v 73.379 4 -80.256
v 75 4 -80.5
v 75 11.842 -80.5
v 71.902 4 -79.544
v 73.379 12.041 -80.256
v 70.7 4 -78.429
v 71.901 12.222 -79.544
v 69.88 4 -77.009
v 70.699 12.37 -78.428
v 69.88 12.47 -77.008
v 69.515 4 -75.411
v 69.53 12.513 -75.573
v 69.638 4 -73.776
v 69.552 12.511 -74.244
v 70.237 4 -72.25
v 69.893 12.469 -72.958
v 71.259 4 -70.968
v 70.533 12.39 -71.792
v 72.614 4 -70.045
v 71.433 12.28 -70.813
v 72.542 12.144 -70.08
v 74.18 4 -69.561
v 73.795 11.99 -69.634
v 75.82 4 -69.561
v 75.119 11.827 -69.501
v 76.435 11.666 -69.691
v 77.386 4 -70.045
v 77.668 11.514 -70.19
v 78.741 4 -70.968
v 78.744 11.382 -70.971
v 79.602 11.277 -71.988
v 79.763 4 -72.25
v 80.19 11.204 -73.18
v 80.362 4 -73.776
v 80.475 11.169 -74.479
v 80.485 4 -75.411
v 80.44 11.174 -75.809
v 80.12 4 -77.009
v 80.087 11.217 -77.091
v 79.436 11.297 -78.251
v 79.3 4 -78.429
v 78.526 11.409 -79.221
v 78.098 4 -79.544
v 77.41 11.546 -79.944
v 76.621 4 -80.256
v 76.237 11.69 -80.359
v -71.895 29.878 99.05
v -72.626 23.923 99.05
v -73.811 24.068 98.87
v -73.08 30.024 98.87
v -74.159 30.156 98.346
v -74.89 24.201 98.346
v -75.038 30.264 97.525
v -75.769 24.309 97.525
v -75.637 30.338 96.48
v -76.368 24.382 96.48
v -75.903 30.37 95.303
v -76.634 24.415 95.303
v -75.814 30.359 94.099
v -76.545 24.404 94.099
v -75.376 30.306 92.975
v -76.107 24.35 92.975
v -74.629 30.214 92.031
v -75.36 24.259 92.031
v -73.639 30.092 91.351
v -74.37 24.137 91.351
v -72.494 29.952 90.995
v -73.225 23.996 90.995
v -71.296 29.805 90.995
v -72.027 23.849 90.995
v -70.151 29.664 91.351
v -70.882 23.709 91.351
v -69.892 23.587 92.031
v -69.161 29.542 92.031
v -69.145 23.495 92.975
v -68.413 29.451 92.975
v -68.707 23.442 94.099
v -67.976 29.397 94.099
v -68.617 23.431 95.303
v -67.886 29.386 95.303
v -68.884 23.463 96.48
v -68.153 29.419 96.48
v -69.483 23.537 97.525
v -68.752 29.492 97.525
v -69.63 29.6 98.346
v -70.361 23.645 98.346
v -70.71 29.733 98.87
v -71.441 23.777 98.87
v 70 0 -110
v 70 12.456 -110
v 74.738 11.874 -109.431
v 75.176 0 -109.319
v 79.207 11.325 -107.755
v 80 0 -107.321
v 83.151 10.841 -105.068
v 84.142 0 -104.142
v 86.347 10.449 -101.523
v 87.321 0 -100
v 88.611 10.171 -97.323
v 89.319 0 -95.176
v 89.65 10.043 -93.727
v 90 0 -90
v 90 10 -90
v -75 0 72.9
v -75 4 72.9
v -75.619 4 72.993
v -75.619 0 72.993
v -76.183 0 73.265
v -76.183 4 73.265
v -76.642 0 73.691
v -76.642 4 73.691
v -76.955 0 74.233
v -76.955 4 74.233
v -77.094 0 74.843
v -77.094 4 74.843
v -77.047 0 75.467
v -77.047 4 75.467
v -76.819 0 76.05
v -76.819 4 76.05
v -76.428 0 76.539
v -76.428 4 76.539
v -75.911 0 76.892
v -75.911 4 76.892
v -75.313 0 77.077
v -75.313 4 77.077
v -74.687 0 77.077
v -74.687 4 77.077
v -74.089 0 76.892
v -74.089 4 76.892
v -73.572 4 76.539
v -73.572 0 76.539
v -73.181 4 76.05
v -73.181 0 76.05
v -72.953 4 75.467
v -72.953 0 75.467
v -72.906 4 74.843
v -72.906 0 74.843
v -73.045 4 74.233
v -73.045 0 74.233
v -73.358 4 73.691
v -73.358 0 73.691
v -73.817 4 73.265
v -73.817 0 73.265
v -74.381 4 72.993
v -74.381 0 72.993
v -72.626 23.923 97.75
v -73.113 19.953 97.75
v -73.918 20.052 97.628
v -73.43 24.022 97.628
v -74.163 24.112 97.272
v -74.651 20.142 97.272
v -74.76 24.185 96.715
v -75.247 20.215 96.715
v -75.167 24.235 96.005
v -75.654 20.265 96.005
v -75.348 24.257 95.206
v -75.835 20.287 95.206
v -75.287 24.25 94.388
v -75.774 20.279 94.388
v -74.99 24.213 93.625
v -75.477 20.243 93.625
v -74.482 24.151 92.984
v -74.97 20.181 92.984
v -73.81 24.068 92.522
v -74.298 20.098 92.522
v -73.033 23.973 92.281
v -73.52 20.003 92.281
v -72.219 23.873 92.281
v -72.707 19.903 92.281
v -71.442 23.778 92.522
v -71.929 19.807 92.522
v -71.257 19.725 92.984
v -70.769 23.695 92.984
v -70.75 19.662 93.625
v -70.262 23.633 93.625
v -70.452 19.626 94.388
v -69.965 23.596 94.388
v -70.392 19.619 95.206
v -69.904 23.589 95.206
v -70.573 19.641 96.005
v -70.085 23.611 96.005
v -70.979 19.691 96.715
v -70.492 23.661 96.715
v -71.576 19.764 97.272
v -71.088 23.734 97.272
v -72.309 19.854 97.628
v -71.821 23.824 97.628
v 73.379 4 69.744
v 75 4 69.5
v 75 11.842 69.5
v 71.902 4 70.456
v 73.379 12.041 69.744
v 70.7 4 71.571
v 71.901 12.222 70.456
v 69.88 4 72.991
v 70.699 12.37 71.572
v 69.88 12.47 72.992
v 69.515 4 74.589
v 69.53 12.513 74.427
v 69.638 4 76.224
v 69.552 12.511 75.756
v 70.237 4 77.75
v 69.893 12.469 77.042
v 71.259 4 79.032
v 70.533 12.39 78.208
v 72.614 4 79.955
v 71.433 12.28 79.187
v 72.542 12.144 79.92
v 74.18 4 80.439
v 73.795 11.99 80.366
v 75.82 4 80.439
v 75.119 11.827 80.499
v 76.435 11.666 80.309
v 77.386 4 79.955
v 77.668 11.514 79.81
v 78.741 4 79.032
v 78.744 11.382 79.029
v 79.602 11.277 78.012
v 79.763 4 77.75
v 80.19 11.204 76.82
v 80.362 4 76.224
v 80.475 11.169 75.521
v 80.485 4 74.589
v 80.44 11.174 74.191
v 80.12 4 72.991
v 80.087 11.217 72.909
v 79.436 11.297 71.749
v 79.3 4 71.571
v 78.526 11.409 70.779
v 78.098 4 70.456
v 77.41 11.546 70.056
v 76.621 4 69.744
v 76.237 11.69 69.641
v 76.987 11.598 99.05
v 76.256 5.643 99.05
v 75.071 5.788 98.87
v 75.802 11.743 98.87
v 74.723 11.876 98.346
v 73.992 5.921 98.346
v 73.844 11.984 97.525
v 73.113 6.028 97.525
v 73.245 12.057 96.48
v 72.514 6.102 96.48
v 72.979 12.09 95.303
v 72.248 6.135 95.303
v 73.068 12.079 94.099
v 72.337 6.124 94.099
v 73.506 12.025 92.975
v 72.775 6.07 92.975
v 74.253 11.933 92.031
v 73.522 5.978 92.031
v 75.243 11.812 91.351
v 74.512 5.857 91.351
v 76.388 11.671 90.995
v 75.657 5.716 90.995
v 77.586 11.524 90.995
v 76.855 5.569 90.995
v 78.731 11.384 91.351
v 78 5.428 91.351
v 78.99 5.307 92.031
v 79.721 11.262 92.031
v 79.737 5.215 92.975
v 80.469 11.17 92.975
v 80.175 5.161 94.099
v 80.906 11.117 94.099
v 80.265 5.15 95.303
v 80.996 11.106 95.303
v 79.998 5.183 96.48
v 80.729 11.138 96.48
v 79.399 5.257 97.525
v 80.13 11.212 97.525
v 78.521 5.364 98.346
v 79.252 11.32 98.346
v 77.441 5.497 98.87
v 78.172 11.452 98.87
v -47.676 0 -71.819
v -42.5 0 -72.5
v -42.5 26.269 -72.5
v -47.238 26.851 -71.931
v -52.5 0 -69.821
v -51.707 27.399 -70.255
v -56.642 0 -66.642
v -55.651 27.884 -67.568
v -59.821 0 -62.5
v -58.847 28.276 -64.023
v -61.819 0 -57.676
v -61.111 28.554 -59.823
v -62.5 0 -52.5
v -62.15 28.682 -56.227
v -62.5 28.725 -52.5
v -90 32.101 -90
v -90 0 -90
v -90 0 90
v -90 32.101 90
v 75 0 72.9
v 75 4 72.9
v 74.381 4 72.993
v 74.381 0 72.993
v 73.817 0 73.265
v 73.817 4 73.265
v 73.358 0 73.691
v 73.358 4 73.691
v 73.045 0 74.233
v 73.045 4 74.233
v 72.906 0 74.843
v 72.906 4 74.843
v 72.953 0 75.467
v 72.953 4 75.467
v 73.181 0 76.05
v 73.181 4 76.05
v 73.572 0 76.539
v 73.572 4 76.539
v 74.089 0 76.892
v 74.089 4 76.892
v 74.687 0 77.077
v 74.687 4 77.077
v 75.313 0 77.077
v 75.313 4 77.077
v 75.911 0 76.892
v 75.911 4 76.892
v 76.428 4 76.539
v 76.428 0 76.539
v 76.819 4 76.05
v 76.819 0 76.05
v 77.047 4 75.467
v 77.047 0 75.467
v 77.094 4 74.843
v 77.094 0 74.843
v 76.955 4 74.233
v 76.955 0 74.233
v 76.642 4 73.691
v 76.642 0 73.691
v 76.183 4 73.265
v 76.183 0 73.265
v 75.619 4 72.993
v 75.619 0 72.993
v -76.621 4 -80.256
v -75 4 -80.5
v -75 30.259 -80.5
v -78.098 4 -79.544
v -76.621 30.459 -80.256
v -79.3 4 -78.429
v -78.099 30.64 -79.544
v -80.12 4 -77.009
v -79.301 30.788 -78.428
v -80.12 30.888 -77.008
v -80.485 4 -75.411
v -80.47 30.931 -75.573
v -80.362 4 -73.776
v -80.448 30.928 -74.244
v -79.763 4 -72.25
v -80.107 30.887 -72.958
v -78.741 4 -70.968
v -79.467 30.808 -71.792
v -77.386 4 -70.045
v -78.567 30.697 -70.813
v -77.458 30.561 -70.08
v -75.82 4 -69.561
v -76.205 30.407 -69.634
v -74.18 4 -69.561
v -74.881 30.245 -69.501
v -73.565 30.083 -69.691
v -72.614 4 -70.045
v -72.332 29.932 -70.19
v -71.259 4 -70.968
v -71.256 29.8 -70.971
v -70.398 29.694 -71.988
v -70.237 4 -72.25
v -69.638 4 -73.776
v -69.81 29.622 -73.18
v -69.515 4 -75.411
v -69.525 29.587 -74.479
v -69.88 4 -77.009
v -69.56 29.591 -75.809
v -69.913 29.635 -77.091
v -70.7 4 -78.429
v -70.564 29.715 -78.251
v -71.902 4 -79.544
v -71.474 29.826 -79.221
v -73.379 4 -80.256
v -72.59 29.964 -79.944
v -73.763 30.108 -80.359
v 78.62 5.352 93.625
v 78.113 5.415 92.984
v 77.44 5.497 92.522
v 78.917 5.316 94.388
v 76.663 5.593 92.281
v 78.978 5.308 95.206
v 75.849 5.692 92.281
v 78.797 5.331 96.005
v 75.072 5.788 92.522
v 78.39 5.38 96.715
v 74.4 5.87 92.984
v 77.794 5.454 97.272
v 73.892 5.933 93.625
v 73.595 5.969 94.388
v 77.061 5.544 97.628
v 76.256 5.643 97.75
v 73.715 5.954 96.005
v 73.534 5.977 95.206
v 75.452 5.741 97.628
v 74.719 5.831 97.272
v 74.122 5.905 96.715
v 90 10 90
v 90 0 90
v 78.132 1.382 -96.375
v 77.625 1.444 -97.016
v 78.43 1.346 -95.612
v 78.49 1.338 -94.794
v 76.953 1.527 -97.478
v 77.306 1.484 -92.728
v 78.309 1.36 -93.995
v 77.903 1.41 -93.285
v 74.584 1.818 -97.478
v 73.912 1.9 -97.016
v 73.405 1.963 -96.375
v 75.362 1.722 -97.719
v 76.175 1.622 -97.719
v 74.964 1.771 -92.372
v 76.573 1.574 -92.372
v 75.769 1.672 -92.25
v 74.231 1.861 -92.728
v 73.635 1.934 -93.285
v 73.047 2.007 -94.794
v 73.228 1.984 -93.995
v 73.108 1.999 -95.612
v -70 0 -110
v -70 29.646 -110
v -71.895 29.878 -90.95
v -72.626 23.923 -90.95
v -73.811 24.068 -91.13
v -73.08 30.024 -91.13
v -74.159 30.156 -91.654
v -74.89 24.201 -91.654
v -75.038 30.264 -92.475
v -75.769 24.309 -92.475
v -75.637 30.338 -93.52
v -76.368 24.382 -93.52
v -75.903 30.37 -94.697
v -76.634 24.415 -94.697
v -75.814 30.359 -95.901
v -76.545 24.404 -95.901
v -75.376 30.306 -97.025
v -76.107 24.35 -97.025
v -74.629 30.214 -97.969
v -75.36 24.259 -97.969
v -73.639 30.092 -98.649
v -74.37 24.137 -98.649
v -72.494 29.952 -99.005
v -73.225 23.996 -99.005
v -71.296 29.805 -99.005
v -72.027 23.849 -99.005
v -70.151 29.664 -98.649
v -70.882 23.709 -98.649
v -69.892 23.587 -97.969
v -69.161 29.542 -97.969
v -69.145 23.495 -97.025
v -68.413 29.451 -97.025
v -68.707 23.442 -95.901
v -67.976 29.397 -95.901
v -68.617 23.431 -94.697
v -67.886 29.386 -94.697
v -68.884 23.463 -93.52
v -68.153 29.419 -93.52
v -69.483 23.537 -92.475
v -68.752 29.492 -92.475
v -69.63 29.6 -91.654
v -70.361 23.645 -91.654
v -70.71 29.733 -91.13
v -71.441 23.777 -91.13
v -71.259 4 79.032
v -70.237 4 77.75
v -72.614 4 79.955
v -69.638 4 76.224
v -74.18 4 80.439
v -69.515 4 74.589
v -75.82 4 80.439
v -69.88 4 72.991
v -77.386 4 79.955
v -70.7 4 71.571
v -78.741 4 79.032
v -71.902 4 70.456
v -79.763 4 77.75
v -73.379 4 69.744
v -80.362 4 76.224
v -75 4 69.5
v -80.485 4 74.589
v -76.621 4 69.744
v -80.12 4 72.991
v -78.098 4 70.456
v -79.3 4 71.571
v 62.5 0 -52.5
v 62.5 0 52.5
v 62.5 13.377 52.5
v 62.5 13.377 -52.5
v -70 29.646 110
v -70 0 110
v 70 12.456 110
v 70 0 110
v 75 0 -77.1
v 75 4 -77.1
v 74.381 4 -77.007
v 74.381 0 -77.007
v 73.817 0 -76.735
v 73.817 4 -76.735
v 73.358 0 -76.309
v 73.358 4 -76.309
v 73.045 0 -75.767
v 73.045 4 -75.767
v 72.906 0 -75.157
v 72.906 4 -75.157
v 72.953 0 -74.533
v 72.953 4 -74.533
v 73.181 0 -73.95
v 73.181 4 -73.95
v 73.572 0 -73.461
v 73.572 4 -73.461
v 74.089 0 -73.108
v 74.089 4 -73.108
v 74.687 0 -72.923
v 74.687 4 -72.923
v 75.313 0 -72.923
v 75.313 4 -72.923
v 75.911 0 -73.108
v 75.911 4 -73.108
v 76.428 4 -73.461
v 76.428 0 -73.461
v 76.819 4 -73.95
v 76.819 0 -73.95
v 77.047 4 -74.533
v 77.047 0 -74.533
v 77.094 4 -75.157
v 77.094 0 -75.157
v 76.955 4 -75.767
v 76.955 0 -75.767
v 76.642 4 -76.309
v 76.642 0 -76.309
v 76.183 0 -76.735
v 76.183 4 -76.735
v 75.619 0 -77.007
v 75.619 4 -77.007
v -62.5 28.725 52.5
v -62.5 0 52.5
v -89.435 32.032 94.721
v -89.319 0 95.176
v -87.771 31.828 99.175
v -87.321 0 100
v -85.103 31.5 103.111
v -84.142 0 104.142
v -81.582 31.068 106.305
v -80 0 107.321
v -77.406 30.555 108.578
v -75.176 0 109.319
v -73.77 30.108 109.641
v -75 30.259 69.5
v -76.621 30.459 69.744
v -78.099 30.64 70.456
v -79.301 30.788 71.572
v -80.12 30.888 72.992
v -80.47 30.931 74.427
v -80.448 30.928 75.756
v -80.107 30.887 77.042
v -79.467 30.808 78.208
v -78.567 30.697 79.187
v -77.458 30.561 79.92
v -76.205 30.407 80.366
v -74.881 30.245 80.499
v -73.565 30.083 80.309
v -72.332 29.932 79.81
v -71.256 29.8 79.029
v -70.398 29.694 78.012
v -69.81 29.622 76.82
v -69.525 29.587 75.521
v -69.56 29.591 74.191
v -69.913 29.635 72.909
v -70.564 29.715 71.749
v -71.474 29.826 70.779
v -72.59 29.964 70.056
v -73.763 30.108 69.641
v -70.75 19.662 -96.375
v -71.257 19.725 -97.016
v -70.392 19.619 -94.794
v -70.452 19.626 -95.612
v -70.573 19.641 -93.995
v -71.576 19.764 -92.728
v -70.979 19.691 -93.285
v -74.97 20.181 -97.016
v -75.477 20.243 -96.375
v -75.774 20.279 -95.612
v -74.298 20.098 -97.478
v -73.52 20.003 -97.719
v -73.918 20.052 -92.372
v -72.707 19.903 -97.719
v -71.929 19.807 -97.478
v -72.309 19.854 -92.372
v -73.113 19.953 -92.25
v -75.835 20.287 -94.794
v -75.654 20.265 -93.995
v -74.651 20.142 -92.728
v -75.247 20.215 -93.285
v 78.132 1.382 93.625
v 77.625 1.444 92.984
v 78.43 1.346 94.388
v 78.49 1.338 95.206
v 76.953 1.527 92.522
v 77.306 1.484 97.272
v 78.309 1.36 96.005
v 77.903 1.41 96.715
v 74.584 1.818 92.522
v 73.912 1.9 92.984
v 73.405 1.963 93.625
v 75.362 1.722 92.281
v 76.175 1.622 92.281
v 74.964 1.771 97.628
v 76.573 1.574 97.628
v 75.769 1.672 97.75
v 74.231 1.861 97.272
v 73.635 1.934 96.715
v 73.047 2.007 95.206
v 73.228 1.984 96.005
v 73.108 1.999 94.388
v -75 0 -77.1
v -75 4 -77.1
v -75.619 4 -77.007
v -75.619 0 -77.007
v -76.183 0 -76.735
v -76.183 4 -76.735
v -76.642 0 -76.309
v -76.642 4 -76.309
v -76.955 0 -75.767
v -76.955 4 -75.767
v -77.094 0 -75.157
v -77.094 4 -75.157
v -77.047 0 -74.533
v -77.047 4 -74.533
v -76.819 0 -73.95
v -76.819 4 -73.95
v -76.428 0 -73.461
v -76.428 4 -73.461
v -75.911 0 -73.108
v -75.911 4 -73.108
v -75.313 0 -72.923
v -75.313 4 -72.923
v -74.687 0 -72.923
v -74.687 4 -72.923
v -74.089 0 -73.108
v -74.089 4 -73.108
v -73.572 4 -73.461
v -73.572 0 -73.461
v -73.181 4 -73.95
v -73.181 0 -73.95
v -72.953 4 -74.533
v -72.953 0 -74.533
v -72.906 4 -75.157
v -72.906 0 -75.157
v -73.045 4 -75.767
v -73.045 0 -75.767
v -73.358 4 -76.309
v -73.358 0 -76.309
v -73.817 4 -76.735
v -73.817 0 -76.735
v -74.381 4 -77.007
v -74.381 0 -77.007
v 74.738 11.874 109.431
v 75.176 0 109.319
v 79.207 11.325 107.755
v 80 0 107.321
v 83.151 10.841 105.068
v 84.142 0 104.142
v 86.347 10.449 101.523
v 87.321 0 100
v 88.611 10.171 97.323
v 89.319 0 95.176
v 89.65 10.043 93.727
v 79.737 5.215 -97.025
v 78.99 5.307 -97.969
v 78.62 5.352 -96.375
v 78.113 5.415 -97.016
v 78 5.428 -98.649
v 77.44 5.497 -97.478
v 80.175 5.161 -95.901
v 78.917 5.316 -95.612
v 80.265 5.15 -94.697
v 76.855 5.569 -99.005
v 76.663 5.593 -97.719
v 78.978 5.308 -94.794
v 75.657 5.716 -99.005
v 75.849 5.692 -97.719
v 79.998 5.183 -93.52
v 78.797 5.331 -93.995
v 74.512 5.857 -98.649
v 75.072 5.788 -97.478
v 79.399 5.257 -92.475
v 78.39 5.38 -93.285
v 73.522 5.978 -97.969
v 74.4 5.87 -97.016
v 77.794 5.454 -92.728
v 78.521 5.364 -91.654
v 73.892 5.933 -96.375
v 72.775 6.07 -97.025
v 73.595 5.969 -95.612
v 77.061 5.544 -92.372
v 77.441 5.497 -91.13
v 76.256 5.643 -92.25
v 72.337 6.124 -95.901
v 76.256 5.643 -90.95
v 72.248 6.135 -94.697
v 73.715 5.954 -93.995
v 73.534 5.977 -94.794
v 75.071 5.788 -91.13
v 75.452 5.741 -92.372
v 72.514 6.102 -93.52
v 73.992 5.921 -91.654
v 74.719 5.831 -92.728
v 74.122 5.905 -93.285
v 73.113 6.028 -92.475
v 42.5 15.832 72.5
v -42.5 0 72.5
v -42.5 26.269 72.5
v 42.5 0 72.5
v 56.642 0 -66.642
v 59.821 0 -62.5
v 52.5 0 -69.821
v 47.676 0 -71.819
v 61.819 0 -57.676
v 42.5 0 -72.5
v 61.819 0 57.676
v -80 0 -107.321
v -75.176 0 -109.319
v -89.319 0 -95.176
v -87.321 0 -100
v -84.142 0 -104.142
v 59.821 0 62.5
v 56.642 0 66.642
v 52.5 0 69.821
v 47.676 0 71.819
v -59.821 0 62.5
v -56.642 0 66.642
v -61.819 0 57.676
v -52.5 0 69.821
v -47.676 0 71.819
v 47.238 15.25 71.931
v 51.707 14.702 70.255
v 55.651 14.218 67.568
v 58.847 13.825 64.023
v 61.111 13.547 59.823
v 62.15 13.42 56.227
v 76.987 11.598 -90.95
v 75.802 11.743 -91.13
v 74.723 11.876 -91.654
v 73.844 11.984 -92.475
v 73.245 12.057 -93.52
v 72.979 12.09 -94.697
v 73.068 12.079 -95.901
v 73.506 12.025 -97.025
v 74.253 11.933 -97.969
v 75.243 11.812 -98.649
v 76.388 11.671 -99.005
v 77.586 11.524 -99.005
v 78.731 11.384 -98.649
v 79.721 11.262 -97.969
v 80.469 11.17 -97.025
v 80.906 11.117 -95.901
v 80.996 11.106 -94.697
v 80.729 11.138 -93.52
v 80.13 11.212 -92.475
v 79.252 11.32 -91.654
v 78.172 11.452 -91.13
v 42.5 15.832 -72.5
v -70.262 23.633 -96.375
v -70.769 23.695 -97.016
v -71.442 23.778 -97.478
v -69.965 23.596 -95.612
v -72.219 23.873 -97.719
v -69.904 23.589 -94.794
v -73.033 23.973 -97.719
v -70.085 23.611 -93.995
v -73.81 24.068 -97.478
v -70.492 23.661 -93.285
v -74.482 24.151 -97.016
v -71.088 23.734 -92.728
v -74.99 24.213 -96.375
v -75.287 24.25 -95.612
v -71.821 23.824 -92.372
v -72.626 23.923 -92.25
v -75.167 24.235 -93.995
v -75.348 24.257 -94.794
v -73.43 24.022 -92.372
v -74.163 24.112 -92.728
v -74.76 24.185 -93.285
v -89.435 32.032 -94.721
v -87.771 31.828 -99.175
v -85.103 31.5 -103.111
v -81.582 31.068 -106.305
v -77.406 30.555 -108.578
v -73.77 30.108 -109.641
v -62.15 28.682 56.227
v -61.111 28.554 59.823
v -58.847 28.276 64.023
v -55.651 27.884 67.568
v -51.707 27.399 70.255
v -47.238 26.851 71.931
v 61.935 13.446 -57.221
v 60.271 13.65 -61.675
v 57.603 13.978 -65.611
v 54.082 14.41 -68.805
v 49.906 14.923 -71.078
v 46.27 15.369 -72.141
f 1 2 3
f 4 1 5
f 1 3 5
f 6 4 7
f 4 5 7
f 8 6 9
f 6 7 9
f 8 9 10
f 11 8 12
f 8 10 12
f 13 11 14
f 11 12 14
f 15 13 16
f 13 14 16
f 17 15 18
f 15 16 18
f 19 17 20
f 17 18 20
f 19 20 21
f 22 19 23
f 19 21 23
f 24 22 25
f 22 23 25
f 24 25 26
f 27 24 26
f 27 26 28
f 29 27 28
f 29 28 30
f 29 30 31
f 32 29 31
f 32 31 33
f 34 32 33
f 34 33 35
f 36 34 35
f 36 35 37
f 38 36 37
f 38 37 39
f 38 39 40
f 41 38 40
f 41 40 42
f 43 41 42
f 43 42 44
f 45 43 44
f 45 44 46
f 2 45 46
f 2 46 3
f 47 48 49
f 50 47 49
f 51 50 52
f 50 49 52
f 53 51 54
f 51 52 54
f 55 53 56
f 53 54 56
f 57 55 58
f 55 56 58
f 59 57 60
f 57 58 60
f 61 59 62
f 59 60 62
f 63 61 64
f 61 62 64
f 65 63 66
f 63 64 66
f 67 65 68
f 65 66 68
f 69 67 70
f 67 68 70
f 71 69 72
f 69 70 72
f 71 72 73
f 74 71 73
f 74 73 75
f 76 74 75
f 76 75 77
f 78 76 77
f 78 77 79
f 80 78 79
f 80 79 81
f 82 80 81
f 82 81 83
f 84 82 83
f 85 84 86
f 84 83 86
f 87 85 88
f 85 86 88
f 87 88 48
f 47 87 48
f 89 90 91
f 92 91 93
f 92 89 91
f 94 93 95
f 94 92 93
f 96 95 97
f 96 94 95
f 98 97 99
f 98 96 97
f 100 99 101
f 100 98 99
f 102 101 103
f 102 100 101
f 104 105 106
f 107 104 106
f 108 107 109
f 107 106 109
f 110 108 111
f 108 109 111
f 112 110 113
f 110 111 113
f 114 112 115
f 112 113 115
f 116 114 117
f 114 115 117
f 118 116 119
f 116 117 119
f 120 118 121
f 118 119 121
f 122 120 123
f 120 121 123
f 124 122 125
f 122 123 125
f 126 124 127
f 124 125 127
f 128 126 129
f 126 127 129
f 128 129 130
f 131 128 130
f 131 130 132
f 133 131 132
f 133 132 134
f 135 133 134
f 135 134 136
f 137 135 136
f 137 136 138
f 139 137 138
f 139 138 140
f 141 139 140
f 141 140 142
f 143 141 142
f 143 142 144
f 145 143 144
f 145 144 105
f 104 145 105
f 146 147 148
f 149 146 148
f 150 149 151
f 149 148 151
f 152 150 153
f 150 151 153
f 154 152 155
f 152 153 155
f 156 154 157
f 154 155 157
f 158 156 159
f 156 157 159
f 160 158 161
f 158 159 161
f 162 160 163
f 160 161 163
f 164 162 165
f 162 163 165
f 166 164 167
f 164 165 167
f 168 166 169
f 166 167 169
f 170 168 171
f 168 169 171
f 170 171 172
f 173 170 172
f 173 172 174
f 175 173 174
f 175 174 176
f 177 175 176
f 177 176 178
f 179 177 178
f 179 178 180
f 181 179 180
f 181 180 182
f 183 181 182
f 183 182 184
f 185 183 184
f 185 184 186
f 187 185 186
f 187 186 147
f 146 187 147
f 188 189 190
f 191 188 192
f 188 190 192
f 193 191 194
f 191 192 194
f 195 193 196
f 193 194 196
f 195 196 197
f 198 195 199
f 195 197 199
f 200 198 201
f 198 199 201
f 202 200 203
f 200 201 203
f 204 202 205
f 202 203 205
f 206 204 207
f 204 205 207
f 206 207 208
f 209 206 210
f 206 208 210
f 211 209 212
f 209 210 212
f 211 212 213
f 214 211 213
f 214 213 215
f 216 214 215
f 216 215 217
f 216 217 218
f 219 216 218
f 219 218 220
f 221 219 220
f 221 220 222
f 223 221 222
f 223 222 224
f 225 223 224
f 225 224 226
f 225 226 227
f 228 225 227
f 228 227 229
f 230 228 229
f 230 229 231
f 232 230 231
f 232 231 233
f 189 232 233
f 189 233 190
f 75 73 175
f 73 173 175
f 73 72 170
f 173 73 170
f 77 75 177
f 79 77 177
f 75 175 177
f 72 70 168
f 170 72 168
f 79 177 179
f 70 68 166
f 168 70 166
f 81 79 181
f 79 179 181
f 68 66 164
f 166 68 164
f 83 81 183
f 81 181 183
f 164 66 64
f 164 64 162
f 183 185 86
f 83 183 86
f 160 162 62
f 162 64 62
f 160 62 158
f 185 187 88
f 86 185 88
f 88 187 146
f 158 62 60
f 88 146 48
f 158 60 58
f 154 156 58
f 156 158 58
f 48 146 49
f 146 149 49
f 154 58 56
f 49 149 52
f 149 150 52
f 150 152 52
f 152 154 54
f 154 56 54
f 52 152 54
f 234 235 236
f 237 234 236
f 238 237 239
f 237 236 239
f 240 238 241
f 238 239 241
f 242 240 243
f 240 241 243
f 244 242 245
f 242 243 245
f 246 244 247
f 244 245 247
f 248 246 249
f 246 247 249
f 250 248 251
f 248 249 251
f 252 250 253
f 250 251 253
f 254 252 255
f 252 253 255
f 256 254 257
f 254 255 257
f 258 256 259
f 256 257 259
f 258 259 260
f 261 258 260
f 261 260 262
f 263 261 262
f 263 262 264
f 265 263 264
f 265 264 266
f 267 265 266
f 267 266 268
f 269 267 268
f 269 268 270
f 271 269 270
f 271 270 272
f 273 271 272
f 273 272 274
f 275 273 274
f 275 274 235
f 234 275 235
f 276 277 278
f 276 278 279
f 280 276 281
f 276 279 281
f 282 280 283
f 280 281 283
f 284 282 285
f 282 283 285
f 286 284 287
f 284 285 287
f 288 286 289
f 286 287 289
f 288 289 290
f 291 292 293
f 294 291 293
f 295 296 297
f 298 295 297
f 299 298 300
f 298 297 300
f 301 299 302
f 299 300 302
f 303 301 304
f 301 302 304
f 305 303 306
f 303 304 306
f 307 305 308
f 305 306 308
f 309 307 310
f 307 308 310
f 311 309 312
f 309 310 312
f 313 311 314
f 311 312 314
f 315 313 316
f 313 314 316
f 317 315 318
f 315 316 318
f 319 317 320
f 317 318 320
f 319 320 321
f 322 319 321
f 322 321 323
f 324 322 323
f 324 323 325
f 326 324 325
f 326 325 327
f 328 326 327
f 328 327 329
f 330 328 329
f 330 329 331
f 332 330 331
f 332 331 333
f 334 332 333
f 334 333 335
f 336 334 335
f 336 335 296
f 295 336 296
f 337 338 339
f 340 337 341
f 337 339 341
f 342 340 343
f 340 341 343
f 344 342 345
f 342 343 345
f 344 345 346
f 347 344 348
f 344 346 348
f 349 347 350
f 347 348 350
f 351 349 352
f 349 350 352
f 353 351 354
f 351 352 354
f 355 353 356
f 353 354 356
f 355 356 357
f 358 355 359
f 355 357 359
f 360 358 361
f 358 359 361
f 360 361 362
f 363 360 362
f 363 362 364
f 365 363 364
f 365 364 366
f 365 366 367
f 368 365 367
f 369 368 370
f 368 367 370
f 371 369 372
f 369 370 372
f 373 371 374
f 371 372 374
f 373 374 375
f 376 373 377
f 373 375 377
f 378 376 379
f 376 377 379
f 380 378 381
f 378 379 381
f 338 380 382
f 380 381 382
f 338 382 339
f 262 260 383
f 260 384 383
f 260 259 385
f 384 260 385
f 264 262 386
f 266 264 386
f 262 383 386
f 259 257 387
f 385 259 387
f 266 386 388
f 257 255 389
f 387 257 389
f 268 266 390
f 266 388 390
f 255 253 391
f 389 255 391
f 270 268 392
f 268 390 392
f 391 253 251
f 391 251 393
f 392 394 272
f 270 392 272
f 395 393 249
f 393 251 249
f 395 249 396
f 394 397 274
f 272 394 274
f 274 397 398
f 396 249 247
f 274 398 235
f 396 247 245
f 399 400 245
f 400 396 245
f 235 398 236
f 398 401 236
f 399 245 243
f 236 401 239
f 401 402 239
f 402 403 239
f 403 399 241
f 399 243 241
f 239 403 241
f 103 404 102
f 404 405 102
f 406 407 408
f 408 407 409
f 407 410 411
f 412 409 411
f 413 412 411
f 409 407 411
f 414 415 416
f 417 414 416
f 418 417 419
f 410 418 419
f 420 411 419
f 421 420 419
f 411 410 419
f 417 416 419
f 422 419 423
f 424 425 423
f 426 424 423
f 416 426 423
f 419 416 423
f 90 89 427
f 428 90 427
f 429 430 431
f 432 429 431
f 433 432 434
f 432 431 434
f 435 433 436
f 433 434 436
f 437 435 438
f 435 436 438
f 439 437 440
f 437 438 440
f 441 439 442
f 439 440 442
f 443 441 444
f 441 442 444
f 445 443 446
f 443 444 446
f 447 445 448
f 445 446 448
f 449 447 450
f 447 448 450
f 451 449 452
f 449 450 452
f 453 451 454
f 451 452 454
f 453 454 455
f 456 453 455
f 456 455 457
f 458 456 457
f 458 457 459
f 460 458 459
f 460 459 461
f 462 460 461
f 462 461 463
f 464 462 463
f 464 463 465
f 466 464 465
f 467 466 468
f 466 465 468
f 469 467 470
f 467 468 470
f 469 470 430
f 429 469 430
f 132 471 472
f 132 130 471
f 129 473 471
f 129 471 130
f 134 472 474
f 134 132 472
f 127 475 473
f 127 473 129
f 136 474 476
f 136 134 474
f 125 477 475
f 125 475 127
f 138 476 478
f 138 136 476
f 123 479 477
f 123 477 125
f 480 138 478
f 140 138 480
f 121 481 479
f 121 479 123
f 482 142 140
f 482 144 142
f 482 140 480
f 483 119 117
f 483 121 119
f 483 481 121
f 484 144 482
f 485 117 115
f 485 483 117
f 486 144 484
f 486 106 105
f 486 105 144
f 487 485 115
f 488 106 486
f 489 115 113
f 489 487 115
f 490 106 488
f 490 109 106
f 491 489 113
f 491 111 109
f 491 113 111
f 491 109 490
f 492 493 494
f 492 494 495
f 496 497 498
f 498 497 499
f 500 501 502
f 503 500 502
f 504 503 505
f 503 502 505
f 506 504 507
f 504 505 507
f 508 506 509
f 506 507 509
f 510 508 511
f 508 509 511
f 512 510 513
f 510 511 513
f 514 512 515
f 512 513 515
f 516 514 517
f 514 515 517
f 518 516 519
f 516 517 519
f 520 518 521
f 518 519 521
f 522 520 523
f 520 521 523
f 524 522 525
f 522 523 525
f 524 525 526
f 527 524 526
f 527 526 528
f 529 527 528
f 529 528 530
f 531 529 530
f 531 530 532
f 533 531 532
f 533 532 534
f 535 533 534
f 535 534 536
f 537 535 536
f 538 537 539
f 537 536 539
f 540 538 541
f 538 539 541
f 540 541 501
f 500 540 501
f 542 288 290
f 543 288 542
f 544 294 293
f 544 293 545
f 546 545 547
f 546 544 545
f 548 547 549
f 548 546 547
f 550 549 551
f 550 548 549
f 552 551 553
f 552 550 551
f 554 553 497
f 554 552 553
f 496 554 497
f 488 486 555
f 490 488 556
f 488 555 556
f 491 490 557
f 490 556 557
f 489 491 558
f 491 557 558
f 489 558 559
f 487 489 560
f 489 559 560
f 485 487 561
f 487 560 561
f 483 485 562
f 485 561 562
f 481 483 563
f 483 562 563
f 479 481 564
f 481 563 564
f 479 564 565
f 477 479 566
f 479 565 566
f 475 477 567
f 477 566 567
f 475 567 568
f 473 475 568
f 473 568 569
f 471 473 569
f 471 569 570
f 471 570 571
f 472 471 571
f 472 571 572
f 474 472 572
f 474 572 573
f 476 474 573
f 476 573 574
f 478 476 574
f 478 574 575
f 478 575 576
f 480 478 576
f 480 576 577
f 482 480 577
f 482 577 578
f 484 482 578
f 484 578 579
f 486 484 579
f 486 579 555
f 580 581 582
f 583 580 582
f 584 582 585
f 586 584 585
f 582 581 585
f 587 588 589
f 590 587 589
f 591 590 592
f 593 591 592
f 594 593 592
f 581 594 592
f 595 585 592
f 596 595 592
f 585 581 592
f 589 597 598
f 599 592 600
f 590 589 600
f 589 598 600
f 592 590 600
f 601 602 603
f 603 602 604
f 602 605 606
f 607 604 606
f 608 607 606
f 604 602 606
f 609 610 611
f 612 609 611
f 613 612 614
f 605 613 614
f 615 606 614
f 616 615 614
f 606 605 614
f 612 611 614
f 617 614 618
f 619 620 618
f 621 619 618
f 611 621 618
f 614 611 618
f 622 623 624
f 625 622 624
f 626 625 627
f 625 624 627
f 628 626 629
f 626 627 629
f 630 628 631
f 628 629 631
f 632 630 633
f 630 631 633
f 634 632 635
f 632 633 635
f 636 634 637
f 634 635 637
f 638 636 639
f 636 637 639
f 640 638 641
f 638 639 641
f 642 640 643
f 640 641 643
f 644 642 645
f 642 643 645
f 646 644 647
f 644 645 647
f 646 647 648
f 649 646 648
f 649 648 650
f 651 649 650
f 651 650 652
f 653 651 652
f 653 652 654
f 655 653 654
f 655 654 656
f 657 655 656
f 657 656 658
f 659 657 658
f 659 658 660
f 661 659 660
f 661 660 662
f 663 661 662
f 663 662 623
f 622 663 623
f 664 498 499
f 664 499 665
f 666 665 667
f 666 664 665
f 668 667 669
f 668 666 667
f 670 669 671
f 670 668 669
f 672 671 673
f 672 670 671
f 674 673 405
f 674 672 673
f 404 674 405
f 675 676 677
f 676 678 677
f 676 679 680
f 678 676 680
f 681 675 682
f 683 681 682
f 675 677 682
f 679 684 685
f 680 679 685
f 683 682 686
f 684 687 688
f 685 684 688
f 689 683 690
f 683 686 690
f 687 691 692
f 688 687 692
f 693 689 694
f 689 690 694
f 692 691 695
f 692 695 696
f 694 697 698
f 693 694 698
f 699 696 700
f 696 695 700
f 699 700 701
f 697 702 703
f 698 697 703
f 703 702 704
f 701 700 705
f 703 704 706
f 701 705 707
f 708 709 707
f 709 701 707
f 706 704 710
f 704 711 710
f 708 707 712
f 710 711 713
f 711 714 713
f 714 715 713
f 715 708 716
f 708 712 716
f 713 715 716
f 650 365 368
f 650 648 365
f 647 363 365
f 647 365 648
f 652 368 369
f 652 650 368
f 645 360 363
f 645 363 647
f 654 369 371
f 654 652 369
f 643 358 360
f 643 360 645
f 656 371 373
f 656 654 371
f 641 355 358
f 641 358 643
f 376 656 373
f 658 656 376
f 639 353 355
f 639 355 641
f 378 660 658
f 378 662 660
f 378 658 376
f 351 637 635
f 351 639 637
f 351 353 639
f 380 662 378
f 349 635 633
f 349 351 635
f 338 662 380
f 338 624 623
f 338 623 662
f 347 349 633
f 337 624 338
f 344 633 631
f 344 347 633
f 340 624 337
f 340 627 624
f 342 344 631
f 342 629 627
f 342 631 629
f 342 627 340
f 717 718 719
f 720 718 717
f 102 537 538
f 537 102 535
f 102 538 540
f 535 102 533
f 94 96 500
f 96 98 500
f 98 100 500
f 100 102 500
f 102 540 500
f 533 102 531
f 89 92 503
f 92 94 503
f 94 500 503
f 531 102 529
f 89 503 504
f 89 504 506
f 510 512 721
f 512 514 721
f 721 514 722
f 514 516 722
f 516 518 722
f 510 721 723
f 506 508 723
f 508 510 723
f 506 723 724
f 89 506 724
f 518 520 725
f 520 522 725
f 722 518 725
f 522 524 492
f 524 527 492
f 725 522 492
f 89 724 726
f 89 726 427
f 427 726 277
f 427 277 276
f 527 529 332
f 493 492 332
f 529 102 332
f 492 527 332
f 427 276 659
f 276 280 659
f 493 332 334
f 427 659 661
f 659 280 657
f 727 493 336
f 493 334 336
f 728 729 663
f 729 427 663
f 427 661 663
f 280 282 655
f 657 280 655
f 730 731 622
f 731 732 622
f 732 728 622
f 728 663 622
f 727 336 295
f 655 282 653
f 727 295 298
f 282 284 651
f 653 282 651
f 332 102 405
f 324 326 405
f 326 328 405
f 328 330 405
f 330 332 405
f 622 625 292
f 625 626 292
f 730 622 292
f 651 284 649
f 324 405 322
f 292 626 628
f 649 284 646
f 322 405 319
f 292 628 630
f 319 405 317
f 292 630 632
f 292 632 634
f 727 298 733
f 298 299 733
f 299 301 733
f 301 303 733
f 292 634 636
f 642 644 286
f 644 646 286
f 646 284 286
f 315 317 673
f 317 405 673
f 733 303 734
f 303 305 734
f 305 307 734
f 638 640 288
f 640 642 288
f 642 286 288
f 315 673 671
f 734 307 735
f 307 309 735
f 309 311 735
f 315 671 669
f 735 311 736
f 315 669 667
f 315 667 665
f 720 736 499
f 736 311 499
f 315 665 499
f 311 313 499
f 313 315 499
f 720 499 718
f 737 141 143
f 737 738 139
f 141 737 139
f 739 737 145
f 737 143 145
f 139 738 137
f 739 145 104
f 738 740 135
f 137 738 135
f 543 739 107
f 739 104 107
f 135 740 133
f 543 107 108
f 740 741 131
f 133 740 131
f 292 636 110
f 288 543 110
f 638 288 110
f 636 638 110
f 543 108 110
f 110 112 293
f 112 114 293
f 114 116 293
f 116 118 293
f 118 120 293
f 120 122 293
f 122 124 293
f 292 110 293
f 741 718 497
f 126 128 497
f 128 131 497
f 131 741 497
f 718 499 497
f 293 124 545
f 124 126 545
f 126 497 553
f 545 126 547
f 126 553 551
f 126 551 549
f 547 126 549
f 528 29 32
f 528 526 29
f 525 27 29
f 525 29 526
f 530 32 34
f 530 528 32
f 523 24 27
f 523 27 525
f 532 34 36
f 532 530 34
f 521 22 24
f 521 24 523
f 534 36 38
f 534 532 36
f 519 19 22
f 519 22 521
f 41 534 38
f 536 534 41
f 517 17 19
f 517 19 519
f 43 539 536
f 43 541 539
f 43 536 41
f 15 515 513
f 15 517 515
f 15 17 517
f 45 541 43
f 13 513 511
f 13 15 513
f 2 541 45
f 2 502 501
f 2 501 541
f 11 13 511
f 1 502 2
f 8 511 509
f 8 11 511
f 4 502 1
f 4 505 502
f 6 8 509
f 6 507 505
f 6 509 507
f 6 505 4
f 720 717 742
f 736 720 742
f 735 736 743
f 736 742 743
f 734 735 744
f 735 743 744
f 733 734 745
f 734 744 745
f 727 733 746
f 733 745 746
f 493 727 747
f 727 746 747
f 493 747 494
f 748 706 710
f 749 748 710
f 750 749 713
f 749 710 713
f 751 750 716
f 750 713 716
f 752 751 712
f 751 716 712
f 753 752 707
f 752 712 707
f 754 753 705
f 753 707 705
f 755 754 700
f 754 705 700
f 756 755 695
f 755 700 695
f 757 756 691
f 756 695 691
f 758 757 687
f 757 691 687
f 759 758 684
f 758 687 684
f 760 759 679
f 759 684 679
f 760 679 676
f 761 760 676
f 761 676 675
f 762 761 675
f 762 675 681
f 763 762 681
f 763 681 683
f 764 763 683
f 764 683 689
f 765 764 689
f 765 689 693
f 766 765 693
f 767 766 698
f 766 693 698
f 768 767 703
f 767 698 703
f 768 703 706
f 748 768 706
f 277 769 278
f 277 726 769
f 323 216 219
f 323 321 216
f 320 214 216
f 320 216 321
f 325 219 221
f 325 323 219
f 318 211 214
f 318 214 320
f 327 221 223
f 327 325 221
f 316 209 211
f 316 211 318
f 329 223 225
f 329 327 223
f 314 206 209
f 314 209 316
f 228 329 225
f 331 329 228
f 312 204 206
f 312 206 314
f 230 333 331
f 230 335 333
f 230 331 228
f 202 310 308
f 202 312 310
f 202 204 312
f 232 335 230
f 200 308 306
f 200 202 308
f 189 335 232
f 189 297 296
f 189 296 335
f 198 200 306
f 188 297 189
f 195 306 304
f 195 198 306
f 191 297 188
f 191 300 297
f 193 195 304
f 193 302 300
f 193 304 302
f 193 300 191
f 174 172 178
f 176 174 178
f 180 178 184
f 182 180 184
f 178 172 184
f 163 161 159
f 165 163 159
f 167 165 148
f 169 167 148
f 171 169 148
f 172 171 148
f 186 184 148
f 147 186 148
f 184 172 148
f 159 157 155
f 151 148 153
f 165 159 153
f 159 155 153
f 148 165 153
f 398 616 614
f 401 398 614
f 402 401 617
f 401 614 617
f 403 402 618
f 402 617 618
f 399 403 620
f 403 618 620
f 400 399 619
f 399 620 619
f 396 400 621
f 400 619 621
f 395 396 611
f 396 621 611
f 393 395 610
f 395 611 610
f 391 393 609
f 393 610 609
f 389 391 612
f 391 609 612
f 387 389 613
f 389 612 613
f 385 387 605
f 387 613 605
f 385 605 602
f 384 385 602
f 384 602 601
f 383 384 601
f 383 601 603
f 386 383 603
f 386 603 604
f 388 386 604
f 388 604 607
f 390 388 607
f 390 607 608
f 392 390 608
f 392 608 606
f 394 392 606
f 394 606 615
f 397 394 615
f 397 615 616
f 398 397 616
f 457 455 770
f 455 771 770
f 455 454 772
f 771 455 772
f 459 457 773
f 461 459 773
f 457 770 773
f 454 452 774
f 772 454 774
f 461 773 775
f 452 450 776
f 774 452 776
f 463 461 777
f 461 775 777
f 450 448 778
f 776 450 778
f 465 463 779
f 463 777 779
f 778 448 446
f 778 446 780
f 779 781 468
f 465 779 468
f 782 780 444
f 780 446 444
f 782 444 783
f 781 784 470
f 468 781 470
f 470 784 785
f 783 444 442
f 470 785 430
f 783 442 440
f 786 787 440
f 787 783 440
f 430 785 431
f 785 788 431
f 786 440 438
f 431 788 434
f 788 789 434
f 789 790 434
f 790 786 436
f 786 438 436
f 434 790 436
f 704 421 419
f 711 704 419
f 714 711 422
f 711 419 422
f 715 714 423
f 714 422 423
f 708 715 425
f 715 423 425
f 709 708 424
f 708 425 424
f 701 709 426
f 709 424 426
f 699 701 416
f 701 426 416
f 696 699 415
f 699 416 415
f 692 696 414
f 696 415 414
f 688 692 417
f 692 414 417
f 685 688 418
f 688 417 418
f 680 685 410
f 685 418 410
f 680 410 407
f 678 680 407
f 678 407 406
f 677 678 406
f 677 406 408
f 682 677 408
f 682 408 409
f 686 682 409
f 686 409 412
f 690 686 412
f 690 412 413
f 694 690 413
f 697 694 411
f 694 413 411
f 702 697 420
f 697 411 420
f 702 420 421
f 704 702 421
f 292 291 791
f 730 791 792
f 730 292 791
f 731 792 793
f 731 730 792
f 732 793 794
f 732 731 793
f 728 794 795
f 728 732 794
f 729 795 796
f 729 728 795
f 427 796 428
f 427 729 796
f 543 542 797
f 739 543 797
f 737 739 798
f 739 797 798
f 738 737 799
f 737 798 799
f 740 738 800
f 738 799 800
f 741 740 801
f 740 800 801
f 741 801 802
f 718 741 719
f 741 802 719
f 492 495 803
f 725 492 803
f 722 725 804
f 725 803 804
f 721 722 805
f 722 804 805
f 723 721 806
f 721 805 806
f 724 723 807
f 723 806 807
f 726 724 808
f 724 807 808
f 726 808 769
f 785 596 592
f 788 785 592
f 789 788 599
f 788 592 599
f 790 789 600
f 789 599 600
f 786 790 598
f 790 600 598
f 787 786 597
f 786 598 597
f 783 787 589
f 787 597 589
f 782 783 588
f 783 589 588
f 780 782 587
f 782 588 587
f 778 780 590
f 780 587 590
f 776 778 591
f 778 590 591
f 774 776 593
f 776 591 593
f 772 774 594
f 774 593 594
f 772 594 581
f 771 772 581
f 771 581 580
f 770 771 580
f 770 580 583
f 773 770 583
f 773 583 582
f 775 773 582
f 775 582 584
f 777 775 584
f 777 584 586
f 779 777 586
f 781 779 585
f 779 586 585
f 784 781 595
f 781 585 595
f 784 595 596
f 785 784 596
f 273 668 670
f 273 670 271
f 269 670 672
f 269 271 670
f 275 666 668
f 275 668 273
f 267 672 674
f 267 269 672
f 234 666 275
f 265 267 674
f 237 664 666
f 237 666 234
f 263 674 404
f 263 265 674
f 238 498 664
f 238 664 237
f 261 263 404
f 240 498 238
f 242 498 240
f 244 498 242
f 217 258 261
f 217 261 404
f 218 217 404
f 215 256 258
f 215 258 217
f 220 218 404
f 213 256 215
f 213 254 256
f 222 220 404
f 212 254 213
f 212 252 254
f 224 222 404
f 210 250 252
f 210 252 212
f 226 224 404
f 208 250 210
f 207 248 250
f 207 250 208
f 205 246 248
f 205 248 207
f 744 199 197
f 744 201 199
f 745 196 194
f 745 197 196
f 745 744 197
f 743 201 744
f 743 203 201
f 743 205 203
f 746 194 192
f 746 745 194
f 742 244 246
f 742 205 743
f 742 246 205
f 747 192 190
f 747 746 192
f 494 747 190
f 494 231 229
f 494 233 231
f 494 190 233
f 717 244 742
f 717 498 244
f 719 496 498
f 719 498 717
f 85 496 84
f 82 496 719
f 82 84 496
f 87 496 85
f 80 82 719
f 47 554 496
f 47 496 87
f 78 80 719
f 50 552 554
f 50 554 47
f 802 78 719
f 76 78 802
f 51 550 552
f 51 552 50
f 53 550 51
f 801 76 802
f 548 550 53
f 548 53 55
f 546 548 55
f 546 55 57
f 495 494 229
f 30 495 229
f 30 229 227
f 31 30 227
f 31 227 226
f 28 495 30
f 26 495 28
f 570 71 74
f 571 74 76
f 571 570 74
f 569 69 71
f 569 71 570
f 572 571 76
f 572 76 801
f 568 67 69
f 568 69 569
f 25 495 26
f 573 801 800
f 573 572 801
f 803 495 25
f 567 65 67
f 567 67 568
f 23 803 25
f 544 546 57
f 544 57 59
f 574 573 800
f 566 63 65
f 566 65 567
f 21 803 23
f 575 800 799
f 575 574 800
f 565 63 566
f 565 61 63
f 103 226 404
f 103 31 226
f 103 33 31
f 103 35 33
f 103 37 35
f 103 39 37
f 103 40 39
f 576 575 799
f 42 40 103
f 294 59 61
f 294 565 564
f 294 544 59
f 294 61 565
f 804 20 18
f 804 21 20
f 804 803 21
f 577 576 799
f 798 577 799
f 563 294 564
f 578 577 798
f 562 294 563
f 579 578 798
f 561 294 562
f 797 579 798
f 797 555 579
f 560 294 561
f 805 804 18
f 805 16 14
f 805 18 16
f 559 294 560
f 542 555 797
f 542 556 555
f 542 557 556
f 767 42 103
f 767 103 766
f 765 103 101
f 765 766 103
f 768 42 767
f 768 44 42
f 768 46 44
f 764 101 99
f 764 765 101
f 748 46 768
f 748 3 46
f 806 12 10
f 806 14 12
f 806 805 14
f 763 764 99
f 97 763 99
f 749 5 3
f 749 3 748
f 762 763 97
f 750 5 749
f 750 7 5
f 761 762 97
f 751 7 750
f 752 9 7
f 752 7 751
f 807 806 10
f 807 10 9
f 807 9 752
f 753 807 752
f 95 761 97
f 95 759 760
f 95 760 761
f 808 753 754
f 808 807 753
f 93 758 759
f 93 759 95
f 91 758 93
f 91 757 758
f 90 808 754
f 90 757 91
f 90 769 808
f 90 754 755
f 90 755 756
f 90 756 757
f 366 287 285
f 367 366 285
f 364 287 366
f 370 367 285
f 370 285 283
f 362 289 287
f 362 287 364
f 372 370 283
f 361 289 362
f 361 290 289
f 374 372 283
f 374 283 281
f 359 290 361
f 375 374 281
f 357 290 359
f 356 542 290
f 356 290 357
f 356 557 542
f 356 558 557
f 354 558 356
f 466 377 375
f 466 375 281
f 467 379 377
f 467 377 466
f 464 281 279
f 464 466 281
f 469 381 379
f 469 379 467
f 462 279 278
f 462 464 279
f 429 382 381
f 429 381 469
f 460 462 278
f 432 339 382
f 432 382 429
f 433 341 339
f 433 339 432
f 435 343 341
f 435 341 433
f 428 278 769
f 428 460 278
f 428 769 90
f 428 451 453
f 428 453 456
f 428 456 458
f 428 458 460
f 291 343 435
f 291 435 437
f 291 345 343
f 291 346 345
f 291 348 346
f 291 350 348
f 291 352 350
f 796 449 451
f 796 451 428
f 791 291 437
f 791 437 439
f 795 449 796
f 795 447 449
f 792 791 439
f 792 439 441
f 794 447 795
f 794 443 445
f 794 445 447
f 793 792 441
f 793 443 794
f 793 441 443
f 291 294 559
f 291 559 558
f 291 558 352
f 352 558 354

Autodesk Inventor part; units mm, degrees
ref_plane "YZ Plane" through (0, 0, 0) normal (1, 0, 0) x (0, 1, 0)
ref_plane "XZ Plane" through (0, 0, 0) normal (0, 1, 0) x (-1, 0, 0)
sketch "草圖1" plane through (0, 0, 0) normal (0, 1, 0) x (-1, 0, 0)
  line L0 (90, 110) -> (-90, 110)
  line L1 (-90, 110) -> (-90, -110)
  line L2 (-90, -110) -> (90, -110)
  line L3 (90, -110) -> (90, 110)
  line L4 (90, 110) -> (-90, -110) construction
  line L5 (-90, 110) -> (90, -110) construction
  point P0 (0, 0)
  dimension "d0" = 180
  dimension "d1" = 220
extrude "擠出1" add sketch "草圖1" along normal blind 10
sketch "草圖3" plane through (0, 10, 0) normal (0, 1, 0) x (1, 0, 0)
  line L0 (90, -110) -> (90, 110) projected
  line L1 (90, 110) -> (-90, 110) projected
  line L2 (-90, 110) -> (-90, -110) projected
  line L3 (-90, -110) -> (90, -110) projected
  point P0 (0, 0)
extrude "擠出2" add sketch "草圖3" along normal blind 100
sketch "草圖4" plane through (90, 0, 110) normal (1, 0, 0) x (0, 0, -1)
  line L0 (0, 0) -> (220, 0) projected
  line L1 (220, 0) -> (220, 110) projected
  line L2 (0, 110) -> (220, 110) projected
  line L3 (0, 0) -> (0, 110) projected
  line L4 (0, 0) -> (0, 110) projected
  line L5 (0, 10) -> (220, 10)
  point P0 (110, 0)
  dimension "d7" = 10
ref_plane "工作平面2" through (90, 10, 110) normal (0.1219, 0.9925, 0) x (0, 0, -1)
split "分割1" plane through (90, 10, 110) removes the side toward (0.1219, 0.9925, 0)
sketch "草圖5" plane through (0, 0, 0) normal (0, -1, 0) x (1, 0, 0)
  line L0 (-75, -75) -> (75, -75) construction
  line L1 (75, -75) -> (75, 75) construction
  line L2 (75, 75) -> (-75, 75) construction
  line L3 (-75, 75) -> (-75, -75) construction
  line L4 (-75, -75) -> (75, 75) construction
  line L5 (75, -75) -> (-75, 75) construction
  point P0 (0, 0)
  dimension "d9" = 150
  dimension "d10" = 150
hole "孔1" at (-75, 0, -75) at (75, 0, -75) at (75, 0, 75) at (-75, 0, 75) direction (0, 1, 0) diameter 4.2 depth 4
sketch "草圖6" plane through (-75, 4, -75) normal (0, -1, 0) x (1, 0, 0)
  circle A0 centre (0, 150) radius 2.1 projected
  circle A1 centre (150, 150) radius 2.1 projected
  circle A2 centre (150, 0) radius 2.1 projected
  circle A3 centre (0, 0) radius 2.1 projected
  circle A4 centre (0, 0) radius 2.1 projected
  circle A5 centre (150, 0) radius 2.1 projected
  circle A6 centre (0, 150) radius 2.1 projected
  point P0 (75, 75)
hole "孔2" at (-75, 4, -75) at (75, 4, -75) at (75, 4, 75) at (-75, 4, 75) direction (0, 1, 0) diameter 11 end through all
sketch "草圖7" plane through (90, 10, 110) normal (0.1219, 0.9925, 0) x (0.9925, -0.1219, 0)
  line L0 (-163.1105, 15) -> (-13.1105, 15)
  line L1 (-13.1105, 15) -> (-13.1105, 205)
  line L2 (-13.1105, 205) -> (-163.1105, 205)
  line L3 (-163.1105, 205) -> (-163.1105, 15)
  line L4 (-163.1105, 15) -> (-13.1105, 205) construction
  line L5 (-13.1105, 15) -> (-163.1105, 205) construction
  point P0 (-88.1105, 110)
  dimension "d25" = 150
  dimension "d26" = 190
hole "孔3" at (-71.8947, 29.8782, 95) at (76.9873, 11.5978, 95) at (76.9873, 11.5978, -95) at (-71.8947, 29.8782, -95) direction (-0.1219, -0.9925, 0) diameter 5.5 depth 10 counterbore diameter 8.1 counterbore depth 6
sketch "草圖8" plane through (0, 0, 0) normal (0, -1, 0) x (1, 0, 0)
  line L0 (-62.5, 72.5) -> (62.5, 72.5)
  line L1 (62.5, 72.5) -> (62.5, -72.5)
  line L2 (62.5, -72.5) -> (-62.5, -72.5)
  line L3 (-62.5, -72.5) -> (-62.5, 72.5)
  line L4 (-62.5, 72.5) -> (62.5, -72.5) construction
  line L5 (62.5, 72.5) -> (-62.5, -72.5) construction
  point P0 (0, 0)
  dimension "d34" = 125
  dimension "d35" = 145
extrude "擠出3" cut sketch "草圖8" against normal through all
fillet "圓角2" radius 20 8 edges at (-90, 16.0506, 110) (90, 5, 110) (90, 5, -110) (-90, 16.0506, -110) (-62.5, 14.3623, -72.5) (-62.5, 14.3623, 72.5) (62.5, 6.6883, 72.5) (62.5, 6.6883, -72.5)
equation "\"d9\" = d10"
properties part number "頸部桌面轉接件"
